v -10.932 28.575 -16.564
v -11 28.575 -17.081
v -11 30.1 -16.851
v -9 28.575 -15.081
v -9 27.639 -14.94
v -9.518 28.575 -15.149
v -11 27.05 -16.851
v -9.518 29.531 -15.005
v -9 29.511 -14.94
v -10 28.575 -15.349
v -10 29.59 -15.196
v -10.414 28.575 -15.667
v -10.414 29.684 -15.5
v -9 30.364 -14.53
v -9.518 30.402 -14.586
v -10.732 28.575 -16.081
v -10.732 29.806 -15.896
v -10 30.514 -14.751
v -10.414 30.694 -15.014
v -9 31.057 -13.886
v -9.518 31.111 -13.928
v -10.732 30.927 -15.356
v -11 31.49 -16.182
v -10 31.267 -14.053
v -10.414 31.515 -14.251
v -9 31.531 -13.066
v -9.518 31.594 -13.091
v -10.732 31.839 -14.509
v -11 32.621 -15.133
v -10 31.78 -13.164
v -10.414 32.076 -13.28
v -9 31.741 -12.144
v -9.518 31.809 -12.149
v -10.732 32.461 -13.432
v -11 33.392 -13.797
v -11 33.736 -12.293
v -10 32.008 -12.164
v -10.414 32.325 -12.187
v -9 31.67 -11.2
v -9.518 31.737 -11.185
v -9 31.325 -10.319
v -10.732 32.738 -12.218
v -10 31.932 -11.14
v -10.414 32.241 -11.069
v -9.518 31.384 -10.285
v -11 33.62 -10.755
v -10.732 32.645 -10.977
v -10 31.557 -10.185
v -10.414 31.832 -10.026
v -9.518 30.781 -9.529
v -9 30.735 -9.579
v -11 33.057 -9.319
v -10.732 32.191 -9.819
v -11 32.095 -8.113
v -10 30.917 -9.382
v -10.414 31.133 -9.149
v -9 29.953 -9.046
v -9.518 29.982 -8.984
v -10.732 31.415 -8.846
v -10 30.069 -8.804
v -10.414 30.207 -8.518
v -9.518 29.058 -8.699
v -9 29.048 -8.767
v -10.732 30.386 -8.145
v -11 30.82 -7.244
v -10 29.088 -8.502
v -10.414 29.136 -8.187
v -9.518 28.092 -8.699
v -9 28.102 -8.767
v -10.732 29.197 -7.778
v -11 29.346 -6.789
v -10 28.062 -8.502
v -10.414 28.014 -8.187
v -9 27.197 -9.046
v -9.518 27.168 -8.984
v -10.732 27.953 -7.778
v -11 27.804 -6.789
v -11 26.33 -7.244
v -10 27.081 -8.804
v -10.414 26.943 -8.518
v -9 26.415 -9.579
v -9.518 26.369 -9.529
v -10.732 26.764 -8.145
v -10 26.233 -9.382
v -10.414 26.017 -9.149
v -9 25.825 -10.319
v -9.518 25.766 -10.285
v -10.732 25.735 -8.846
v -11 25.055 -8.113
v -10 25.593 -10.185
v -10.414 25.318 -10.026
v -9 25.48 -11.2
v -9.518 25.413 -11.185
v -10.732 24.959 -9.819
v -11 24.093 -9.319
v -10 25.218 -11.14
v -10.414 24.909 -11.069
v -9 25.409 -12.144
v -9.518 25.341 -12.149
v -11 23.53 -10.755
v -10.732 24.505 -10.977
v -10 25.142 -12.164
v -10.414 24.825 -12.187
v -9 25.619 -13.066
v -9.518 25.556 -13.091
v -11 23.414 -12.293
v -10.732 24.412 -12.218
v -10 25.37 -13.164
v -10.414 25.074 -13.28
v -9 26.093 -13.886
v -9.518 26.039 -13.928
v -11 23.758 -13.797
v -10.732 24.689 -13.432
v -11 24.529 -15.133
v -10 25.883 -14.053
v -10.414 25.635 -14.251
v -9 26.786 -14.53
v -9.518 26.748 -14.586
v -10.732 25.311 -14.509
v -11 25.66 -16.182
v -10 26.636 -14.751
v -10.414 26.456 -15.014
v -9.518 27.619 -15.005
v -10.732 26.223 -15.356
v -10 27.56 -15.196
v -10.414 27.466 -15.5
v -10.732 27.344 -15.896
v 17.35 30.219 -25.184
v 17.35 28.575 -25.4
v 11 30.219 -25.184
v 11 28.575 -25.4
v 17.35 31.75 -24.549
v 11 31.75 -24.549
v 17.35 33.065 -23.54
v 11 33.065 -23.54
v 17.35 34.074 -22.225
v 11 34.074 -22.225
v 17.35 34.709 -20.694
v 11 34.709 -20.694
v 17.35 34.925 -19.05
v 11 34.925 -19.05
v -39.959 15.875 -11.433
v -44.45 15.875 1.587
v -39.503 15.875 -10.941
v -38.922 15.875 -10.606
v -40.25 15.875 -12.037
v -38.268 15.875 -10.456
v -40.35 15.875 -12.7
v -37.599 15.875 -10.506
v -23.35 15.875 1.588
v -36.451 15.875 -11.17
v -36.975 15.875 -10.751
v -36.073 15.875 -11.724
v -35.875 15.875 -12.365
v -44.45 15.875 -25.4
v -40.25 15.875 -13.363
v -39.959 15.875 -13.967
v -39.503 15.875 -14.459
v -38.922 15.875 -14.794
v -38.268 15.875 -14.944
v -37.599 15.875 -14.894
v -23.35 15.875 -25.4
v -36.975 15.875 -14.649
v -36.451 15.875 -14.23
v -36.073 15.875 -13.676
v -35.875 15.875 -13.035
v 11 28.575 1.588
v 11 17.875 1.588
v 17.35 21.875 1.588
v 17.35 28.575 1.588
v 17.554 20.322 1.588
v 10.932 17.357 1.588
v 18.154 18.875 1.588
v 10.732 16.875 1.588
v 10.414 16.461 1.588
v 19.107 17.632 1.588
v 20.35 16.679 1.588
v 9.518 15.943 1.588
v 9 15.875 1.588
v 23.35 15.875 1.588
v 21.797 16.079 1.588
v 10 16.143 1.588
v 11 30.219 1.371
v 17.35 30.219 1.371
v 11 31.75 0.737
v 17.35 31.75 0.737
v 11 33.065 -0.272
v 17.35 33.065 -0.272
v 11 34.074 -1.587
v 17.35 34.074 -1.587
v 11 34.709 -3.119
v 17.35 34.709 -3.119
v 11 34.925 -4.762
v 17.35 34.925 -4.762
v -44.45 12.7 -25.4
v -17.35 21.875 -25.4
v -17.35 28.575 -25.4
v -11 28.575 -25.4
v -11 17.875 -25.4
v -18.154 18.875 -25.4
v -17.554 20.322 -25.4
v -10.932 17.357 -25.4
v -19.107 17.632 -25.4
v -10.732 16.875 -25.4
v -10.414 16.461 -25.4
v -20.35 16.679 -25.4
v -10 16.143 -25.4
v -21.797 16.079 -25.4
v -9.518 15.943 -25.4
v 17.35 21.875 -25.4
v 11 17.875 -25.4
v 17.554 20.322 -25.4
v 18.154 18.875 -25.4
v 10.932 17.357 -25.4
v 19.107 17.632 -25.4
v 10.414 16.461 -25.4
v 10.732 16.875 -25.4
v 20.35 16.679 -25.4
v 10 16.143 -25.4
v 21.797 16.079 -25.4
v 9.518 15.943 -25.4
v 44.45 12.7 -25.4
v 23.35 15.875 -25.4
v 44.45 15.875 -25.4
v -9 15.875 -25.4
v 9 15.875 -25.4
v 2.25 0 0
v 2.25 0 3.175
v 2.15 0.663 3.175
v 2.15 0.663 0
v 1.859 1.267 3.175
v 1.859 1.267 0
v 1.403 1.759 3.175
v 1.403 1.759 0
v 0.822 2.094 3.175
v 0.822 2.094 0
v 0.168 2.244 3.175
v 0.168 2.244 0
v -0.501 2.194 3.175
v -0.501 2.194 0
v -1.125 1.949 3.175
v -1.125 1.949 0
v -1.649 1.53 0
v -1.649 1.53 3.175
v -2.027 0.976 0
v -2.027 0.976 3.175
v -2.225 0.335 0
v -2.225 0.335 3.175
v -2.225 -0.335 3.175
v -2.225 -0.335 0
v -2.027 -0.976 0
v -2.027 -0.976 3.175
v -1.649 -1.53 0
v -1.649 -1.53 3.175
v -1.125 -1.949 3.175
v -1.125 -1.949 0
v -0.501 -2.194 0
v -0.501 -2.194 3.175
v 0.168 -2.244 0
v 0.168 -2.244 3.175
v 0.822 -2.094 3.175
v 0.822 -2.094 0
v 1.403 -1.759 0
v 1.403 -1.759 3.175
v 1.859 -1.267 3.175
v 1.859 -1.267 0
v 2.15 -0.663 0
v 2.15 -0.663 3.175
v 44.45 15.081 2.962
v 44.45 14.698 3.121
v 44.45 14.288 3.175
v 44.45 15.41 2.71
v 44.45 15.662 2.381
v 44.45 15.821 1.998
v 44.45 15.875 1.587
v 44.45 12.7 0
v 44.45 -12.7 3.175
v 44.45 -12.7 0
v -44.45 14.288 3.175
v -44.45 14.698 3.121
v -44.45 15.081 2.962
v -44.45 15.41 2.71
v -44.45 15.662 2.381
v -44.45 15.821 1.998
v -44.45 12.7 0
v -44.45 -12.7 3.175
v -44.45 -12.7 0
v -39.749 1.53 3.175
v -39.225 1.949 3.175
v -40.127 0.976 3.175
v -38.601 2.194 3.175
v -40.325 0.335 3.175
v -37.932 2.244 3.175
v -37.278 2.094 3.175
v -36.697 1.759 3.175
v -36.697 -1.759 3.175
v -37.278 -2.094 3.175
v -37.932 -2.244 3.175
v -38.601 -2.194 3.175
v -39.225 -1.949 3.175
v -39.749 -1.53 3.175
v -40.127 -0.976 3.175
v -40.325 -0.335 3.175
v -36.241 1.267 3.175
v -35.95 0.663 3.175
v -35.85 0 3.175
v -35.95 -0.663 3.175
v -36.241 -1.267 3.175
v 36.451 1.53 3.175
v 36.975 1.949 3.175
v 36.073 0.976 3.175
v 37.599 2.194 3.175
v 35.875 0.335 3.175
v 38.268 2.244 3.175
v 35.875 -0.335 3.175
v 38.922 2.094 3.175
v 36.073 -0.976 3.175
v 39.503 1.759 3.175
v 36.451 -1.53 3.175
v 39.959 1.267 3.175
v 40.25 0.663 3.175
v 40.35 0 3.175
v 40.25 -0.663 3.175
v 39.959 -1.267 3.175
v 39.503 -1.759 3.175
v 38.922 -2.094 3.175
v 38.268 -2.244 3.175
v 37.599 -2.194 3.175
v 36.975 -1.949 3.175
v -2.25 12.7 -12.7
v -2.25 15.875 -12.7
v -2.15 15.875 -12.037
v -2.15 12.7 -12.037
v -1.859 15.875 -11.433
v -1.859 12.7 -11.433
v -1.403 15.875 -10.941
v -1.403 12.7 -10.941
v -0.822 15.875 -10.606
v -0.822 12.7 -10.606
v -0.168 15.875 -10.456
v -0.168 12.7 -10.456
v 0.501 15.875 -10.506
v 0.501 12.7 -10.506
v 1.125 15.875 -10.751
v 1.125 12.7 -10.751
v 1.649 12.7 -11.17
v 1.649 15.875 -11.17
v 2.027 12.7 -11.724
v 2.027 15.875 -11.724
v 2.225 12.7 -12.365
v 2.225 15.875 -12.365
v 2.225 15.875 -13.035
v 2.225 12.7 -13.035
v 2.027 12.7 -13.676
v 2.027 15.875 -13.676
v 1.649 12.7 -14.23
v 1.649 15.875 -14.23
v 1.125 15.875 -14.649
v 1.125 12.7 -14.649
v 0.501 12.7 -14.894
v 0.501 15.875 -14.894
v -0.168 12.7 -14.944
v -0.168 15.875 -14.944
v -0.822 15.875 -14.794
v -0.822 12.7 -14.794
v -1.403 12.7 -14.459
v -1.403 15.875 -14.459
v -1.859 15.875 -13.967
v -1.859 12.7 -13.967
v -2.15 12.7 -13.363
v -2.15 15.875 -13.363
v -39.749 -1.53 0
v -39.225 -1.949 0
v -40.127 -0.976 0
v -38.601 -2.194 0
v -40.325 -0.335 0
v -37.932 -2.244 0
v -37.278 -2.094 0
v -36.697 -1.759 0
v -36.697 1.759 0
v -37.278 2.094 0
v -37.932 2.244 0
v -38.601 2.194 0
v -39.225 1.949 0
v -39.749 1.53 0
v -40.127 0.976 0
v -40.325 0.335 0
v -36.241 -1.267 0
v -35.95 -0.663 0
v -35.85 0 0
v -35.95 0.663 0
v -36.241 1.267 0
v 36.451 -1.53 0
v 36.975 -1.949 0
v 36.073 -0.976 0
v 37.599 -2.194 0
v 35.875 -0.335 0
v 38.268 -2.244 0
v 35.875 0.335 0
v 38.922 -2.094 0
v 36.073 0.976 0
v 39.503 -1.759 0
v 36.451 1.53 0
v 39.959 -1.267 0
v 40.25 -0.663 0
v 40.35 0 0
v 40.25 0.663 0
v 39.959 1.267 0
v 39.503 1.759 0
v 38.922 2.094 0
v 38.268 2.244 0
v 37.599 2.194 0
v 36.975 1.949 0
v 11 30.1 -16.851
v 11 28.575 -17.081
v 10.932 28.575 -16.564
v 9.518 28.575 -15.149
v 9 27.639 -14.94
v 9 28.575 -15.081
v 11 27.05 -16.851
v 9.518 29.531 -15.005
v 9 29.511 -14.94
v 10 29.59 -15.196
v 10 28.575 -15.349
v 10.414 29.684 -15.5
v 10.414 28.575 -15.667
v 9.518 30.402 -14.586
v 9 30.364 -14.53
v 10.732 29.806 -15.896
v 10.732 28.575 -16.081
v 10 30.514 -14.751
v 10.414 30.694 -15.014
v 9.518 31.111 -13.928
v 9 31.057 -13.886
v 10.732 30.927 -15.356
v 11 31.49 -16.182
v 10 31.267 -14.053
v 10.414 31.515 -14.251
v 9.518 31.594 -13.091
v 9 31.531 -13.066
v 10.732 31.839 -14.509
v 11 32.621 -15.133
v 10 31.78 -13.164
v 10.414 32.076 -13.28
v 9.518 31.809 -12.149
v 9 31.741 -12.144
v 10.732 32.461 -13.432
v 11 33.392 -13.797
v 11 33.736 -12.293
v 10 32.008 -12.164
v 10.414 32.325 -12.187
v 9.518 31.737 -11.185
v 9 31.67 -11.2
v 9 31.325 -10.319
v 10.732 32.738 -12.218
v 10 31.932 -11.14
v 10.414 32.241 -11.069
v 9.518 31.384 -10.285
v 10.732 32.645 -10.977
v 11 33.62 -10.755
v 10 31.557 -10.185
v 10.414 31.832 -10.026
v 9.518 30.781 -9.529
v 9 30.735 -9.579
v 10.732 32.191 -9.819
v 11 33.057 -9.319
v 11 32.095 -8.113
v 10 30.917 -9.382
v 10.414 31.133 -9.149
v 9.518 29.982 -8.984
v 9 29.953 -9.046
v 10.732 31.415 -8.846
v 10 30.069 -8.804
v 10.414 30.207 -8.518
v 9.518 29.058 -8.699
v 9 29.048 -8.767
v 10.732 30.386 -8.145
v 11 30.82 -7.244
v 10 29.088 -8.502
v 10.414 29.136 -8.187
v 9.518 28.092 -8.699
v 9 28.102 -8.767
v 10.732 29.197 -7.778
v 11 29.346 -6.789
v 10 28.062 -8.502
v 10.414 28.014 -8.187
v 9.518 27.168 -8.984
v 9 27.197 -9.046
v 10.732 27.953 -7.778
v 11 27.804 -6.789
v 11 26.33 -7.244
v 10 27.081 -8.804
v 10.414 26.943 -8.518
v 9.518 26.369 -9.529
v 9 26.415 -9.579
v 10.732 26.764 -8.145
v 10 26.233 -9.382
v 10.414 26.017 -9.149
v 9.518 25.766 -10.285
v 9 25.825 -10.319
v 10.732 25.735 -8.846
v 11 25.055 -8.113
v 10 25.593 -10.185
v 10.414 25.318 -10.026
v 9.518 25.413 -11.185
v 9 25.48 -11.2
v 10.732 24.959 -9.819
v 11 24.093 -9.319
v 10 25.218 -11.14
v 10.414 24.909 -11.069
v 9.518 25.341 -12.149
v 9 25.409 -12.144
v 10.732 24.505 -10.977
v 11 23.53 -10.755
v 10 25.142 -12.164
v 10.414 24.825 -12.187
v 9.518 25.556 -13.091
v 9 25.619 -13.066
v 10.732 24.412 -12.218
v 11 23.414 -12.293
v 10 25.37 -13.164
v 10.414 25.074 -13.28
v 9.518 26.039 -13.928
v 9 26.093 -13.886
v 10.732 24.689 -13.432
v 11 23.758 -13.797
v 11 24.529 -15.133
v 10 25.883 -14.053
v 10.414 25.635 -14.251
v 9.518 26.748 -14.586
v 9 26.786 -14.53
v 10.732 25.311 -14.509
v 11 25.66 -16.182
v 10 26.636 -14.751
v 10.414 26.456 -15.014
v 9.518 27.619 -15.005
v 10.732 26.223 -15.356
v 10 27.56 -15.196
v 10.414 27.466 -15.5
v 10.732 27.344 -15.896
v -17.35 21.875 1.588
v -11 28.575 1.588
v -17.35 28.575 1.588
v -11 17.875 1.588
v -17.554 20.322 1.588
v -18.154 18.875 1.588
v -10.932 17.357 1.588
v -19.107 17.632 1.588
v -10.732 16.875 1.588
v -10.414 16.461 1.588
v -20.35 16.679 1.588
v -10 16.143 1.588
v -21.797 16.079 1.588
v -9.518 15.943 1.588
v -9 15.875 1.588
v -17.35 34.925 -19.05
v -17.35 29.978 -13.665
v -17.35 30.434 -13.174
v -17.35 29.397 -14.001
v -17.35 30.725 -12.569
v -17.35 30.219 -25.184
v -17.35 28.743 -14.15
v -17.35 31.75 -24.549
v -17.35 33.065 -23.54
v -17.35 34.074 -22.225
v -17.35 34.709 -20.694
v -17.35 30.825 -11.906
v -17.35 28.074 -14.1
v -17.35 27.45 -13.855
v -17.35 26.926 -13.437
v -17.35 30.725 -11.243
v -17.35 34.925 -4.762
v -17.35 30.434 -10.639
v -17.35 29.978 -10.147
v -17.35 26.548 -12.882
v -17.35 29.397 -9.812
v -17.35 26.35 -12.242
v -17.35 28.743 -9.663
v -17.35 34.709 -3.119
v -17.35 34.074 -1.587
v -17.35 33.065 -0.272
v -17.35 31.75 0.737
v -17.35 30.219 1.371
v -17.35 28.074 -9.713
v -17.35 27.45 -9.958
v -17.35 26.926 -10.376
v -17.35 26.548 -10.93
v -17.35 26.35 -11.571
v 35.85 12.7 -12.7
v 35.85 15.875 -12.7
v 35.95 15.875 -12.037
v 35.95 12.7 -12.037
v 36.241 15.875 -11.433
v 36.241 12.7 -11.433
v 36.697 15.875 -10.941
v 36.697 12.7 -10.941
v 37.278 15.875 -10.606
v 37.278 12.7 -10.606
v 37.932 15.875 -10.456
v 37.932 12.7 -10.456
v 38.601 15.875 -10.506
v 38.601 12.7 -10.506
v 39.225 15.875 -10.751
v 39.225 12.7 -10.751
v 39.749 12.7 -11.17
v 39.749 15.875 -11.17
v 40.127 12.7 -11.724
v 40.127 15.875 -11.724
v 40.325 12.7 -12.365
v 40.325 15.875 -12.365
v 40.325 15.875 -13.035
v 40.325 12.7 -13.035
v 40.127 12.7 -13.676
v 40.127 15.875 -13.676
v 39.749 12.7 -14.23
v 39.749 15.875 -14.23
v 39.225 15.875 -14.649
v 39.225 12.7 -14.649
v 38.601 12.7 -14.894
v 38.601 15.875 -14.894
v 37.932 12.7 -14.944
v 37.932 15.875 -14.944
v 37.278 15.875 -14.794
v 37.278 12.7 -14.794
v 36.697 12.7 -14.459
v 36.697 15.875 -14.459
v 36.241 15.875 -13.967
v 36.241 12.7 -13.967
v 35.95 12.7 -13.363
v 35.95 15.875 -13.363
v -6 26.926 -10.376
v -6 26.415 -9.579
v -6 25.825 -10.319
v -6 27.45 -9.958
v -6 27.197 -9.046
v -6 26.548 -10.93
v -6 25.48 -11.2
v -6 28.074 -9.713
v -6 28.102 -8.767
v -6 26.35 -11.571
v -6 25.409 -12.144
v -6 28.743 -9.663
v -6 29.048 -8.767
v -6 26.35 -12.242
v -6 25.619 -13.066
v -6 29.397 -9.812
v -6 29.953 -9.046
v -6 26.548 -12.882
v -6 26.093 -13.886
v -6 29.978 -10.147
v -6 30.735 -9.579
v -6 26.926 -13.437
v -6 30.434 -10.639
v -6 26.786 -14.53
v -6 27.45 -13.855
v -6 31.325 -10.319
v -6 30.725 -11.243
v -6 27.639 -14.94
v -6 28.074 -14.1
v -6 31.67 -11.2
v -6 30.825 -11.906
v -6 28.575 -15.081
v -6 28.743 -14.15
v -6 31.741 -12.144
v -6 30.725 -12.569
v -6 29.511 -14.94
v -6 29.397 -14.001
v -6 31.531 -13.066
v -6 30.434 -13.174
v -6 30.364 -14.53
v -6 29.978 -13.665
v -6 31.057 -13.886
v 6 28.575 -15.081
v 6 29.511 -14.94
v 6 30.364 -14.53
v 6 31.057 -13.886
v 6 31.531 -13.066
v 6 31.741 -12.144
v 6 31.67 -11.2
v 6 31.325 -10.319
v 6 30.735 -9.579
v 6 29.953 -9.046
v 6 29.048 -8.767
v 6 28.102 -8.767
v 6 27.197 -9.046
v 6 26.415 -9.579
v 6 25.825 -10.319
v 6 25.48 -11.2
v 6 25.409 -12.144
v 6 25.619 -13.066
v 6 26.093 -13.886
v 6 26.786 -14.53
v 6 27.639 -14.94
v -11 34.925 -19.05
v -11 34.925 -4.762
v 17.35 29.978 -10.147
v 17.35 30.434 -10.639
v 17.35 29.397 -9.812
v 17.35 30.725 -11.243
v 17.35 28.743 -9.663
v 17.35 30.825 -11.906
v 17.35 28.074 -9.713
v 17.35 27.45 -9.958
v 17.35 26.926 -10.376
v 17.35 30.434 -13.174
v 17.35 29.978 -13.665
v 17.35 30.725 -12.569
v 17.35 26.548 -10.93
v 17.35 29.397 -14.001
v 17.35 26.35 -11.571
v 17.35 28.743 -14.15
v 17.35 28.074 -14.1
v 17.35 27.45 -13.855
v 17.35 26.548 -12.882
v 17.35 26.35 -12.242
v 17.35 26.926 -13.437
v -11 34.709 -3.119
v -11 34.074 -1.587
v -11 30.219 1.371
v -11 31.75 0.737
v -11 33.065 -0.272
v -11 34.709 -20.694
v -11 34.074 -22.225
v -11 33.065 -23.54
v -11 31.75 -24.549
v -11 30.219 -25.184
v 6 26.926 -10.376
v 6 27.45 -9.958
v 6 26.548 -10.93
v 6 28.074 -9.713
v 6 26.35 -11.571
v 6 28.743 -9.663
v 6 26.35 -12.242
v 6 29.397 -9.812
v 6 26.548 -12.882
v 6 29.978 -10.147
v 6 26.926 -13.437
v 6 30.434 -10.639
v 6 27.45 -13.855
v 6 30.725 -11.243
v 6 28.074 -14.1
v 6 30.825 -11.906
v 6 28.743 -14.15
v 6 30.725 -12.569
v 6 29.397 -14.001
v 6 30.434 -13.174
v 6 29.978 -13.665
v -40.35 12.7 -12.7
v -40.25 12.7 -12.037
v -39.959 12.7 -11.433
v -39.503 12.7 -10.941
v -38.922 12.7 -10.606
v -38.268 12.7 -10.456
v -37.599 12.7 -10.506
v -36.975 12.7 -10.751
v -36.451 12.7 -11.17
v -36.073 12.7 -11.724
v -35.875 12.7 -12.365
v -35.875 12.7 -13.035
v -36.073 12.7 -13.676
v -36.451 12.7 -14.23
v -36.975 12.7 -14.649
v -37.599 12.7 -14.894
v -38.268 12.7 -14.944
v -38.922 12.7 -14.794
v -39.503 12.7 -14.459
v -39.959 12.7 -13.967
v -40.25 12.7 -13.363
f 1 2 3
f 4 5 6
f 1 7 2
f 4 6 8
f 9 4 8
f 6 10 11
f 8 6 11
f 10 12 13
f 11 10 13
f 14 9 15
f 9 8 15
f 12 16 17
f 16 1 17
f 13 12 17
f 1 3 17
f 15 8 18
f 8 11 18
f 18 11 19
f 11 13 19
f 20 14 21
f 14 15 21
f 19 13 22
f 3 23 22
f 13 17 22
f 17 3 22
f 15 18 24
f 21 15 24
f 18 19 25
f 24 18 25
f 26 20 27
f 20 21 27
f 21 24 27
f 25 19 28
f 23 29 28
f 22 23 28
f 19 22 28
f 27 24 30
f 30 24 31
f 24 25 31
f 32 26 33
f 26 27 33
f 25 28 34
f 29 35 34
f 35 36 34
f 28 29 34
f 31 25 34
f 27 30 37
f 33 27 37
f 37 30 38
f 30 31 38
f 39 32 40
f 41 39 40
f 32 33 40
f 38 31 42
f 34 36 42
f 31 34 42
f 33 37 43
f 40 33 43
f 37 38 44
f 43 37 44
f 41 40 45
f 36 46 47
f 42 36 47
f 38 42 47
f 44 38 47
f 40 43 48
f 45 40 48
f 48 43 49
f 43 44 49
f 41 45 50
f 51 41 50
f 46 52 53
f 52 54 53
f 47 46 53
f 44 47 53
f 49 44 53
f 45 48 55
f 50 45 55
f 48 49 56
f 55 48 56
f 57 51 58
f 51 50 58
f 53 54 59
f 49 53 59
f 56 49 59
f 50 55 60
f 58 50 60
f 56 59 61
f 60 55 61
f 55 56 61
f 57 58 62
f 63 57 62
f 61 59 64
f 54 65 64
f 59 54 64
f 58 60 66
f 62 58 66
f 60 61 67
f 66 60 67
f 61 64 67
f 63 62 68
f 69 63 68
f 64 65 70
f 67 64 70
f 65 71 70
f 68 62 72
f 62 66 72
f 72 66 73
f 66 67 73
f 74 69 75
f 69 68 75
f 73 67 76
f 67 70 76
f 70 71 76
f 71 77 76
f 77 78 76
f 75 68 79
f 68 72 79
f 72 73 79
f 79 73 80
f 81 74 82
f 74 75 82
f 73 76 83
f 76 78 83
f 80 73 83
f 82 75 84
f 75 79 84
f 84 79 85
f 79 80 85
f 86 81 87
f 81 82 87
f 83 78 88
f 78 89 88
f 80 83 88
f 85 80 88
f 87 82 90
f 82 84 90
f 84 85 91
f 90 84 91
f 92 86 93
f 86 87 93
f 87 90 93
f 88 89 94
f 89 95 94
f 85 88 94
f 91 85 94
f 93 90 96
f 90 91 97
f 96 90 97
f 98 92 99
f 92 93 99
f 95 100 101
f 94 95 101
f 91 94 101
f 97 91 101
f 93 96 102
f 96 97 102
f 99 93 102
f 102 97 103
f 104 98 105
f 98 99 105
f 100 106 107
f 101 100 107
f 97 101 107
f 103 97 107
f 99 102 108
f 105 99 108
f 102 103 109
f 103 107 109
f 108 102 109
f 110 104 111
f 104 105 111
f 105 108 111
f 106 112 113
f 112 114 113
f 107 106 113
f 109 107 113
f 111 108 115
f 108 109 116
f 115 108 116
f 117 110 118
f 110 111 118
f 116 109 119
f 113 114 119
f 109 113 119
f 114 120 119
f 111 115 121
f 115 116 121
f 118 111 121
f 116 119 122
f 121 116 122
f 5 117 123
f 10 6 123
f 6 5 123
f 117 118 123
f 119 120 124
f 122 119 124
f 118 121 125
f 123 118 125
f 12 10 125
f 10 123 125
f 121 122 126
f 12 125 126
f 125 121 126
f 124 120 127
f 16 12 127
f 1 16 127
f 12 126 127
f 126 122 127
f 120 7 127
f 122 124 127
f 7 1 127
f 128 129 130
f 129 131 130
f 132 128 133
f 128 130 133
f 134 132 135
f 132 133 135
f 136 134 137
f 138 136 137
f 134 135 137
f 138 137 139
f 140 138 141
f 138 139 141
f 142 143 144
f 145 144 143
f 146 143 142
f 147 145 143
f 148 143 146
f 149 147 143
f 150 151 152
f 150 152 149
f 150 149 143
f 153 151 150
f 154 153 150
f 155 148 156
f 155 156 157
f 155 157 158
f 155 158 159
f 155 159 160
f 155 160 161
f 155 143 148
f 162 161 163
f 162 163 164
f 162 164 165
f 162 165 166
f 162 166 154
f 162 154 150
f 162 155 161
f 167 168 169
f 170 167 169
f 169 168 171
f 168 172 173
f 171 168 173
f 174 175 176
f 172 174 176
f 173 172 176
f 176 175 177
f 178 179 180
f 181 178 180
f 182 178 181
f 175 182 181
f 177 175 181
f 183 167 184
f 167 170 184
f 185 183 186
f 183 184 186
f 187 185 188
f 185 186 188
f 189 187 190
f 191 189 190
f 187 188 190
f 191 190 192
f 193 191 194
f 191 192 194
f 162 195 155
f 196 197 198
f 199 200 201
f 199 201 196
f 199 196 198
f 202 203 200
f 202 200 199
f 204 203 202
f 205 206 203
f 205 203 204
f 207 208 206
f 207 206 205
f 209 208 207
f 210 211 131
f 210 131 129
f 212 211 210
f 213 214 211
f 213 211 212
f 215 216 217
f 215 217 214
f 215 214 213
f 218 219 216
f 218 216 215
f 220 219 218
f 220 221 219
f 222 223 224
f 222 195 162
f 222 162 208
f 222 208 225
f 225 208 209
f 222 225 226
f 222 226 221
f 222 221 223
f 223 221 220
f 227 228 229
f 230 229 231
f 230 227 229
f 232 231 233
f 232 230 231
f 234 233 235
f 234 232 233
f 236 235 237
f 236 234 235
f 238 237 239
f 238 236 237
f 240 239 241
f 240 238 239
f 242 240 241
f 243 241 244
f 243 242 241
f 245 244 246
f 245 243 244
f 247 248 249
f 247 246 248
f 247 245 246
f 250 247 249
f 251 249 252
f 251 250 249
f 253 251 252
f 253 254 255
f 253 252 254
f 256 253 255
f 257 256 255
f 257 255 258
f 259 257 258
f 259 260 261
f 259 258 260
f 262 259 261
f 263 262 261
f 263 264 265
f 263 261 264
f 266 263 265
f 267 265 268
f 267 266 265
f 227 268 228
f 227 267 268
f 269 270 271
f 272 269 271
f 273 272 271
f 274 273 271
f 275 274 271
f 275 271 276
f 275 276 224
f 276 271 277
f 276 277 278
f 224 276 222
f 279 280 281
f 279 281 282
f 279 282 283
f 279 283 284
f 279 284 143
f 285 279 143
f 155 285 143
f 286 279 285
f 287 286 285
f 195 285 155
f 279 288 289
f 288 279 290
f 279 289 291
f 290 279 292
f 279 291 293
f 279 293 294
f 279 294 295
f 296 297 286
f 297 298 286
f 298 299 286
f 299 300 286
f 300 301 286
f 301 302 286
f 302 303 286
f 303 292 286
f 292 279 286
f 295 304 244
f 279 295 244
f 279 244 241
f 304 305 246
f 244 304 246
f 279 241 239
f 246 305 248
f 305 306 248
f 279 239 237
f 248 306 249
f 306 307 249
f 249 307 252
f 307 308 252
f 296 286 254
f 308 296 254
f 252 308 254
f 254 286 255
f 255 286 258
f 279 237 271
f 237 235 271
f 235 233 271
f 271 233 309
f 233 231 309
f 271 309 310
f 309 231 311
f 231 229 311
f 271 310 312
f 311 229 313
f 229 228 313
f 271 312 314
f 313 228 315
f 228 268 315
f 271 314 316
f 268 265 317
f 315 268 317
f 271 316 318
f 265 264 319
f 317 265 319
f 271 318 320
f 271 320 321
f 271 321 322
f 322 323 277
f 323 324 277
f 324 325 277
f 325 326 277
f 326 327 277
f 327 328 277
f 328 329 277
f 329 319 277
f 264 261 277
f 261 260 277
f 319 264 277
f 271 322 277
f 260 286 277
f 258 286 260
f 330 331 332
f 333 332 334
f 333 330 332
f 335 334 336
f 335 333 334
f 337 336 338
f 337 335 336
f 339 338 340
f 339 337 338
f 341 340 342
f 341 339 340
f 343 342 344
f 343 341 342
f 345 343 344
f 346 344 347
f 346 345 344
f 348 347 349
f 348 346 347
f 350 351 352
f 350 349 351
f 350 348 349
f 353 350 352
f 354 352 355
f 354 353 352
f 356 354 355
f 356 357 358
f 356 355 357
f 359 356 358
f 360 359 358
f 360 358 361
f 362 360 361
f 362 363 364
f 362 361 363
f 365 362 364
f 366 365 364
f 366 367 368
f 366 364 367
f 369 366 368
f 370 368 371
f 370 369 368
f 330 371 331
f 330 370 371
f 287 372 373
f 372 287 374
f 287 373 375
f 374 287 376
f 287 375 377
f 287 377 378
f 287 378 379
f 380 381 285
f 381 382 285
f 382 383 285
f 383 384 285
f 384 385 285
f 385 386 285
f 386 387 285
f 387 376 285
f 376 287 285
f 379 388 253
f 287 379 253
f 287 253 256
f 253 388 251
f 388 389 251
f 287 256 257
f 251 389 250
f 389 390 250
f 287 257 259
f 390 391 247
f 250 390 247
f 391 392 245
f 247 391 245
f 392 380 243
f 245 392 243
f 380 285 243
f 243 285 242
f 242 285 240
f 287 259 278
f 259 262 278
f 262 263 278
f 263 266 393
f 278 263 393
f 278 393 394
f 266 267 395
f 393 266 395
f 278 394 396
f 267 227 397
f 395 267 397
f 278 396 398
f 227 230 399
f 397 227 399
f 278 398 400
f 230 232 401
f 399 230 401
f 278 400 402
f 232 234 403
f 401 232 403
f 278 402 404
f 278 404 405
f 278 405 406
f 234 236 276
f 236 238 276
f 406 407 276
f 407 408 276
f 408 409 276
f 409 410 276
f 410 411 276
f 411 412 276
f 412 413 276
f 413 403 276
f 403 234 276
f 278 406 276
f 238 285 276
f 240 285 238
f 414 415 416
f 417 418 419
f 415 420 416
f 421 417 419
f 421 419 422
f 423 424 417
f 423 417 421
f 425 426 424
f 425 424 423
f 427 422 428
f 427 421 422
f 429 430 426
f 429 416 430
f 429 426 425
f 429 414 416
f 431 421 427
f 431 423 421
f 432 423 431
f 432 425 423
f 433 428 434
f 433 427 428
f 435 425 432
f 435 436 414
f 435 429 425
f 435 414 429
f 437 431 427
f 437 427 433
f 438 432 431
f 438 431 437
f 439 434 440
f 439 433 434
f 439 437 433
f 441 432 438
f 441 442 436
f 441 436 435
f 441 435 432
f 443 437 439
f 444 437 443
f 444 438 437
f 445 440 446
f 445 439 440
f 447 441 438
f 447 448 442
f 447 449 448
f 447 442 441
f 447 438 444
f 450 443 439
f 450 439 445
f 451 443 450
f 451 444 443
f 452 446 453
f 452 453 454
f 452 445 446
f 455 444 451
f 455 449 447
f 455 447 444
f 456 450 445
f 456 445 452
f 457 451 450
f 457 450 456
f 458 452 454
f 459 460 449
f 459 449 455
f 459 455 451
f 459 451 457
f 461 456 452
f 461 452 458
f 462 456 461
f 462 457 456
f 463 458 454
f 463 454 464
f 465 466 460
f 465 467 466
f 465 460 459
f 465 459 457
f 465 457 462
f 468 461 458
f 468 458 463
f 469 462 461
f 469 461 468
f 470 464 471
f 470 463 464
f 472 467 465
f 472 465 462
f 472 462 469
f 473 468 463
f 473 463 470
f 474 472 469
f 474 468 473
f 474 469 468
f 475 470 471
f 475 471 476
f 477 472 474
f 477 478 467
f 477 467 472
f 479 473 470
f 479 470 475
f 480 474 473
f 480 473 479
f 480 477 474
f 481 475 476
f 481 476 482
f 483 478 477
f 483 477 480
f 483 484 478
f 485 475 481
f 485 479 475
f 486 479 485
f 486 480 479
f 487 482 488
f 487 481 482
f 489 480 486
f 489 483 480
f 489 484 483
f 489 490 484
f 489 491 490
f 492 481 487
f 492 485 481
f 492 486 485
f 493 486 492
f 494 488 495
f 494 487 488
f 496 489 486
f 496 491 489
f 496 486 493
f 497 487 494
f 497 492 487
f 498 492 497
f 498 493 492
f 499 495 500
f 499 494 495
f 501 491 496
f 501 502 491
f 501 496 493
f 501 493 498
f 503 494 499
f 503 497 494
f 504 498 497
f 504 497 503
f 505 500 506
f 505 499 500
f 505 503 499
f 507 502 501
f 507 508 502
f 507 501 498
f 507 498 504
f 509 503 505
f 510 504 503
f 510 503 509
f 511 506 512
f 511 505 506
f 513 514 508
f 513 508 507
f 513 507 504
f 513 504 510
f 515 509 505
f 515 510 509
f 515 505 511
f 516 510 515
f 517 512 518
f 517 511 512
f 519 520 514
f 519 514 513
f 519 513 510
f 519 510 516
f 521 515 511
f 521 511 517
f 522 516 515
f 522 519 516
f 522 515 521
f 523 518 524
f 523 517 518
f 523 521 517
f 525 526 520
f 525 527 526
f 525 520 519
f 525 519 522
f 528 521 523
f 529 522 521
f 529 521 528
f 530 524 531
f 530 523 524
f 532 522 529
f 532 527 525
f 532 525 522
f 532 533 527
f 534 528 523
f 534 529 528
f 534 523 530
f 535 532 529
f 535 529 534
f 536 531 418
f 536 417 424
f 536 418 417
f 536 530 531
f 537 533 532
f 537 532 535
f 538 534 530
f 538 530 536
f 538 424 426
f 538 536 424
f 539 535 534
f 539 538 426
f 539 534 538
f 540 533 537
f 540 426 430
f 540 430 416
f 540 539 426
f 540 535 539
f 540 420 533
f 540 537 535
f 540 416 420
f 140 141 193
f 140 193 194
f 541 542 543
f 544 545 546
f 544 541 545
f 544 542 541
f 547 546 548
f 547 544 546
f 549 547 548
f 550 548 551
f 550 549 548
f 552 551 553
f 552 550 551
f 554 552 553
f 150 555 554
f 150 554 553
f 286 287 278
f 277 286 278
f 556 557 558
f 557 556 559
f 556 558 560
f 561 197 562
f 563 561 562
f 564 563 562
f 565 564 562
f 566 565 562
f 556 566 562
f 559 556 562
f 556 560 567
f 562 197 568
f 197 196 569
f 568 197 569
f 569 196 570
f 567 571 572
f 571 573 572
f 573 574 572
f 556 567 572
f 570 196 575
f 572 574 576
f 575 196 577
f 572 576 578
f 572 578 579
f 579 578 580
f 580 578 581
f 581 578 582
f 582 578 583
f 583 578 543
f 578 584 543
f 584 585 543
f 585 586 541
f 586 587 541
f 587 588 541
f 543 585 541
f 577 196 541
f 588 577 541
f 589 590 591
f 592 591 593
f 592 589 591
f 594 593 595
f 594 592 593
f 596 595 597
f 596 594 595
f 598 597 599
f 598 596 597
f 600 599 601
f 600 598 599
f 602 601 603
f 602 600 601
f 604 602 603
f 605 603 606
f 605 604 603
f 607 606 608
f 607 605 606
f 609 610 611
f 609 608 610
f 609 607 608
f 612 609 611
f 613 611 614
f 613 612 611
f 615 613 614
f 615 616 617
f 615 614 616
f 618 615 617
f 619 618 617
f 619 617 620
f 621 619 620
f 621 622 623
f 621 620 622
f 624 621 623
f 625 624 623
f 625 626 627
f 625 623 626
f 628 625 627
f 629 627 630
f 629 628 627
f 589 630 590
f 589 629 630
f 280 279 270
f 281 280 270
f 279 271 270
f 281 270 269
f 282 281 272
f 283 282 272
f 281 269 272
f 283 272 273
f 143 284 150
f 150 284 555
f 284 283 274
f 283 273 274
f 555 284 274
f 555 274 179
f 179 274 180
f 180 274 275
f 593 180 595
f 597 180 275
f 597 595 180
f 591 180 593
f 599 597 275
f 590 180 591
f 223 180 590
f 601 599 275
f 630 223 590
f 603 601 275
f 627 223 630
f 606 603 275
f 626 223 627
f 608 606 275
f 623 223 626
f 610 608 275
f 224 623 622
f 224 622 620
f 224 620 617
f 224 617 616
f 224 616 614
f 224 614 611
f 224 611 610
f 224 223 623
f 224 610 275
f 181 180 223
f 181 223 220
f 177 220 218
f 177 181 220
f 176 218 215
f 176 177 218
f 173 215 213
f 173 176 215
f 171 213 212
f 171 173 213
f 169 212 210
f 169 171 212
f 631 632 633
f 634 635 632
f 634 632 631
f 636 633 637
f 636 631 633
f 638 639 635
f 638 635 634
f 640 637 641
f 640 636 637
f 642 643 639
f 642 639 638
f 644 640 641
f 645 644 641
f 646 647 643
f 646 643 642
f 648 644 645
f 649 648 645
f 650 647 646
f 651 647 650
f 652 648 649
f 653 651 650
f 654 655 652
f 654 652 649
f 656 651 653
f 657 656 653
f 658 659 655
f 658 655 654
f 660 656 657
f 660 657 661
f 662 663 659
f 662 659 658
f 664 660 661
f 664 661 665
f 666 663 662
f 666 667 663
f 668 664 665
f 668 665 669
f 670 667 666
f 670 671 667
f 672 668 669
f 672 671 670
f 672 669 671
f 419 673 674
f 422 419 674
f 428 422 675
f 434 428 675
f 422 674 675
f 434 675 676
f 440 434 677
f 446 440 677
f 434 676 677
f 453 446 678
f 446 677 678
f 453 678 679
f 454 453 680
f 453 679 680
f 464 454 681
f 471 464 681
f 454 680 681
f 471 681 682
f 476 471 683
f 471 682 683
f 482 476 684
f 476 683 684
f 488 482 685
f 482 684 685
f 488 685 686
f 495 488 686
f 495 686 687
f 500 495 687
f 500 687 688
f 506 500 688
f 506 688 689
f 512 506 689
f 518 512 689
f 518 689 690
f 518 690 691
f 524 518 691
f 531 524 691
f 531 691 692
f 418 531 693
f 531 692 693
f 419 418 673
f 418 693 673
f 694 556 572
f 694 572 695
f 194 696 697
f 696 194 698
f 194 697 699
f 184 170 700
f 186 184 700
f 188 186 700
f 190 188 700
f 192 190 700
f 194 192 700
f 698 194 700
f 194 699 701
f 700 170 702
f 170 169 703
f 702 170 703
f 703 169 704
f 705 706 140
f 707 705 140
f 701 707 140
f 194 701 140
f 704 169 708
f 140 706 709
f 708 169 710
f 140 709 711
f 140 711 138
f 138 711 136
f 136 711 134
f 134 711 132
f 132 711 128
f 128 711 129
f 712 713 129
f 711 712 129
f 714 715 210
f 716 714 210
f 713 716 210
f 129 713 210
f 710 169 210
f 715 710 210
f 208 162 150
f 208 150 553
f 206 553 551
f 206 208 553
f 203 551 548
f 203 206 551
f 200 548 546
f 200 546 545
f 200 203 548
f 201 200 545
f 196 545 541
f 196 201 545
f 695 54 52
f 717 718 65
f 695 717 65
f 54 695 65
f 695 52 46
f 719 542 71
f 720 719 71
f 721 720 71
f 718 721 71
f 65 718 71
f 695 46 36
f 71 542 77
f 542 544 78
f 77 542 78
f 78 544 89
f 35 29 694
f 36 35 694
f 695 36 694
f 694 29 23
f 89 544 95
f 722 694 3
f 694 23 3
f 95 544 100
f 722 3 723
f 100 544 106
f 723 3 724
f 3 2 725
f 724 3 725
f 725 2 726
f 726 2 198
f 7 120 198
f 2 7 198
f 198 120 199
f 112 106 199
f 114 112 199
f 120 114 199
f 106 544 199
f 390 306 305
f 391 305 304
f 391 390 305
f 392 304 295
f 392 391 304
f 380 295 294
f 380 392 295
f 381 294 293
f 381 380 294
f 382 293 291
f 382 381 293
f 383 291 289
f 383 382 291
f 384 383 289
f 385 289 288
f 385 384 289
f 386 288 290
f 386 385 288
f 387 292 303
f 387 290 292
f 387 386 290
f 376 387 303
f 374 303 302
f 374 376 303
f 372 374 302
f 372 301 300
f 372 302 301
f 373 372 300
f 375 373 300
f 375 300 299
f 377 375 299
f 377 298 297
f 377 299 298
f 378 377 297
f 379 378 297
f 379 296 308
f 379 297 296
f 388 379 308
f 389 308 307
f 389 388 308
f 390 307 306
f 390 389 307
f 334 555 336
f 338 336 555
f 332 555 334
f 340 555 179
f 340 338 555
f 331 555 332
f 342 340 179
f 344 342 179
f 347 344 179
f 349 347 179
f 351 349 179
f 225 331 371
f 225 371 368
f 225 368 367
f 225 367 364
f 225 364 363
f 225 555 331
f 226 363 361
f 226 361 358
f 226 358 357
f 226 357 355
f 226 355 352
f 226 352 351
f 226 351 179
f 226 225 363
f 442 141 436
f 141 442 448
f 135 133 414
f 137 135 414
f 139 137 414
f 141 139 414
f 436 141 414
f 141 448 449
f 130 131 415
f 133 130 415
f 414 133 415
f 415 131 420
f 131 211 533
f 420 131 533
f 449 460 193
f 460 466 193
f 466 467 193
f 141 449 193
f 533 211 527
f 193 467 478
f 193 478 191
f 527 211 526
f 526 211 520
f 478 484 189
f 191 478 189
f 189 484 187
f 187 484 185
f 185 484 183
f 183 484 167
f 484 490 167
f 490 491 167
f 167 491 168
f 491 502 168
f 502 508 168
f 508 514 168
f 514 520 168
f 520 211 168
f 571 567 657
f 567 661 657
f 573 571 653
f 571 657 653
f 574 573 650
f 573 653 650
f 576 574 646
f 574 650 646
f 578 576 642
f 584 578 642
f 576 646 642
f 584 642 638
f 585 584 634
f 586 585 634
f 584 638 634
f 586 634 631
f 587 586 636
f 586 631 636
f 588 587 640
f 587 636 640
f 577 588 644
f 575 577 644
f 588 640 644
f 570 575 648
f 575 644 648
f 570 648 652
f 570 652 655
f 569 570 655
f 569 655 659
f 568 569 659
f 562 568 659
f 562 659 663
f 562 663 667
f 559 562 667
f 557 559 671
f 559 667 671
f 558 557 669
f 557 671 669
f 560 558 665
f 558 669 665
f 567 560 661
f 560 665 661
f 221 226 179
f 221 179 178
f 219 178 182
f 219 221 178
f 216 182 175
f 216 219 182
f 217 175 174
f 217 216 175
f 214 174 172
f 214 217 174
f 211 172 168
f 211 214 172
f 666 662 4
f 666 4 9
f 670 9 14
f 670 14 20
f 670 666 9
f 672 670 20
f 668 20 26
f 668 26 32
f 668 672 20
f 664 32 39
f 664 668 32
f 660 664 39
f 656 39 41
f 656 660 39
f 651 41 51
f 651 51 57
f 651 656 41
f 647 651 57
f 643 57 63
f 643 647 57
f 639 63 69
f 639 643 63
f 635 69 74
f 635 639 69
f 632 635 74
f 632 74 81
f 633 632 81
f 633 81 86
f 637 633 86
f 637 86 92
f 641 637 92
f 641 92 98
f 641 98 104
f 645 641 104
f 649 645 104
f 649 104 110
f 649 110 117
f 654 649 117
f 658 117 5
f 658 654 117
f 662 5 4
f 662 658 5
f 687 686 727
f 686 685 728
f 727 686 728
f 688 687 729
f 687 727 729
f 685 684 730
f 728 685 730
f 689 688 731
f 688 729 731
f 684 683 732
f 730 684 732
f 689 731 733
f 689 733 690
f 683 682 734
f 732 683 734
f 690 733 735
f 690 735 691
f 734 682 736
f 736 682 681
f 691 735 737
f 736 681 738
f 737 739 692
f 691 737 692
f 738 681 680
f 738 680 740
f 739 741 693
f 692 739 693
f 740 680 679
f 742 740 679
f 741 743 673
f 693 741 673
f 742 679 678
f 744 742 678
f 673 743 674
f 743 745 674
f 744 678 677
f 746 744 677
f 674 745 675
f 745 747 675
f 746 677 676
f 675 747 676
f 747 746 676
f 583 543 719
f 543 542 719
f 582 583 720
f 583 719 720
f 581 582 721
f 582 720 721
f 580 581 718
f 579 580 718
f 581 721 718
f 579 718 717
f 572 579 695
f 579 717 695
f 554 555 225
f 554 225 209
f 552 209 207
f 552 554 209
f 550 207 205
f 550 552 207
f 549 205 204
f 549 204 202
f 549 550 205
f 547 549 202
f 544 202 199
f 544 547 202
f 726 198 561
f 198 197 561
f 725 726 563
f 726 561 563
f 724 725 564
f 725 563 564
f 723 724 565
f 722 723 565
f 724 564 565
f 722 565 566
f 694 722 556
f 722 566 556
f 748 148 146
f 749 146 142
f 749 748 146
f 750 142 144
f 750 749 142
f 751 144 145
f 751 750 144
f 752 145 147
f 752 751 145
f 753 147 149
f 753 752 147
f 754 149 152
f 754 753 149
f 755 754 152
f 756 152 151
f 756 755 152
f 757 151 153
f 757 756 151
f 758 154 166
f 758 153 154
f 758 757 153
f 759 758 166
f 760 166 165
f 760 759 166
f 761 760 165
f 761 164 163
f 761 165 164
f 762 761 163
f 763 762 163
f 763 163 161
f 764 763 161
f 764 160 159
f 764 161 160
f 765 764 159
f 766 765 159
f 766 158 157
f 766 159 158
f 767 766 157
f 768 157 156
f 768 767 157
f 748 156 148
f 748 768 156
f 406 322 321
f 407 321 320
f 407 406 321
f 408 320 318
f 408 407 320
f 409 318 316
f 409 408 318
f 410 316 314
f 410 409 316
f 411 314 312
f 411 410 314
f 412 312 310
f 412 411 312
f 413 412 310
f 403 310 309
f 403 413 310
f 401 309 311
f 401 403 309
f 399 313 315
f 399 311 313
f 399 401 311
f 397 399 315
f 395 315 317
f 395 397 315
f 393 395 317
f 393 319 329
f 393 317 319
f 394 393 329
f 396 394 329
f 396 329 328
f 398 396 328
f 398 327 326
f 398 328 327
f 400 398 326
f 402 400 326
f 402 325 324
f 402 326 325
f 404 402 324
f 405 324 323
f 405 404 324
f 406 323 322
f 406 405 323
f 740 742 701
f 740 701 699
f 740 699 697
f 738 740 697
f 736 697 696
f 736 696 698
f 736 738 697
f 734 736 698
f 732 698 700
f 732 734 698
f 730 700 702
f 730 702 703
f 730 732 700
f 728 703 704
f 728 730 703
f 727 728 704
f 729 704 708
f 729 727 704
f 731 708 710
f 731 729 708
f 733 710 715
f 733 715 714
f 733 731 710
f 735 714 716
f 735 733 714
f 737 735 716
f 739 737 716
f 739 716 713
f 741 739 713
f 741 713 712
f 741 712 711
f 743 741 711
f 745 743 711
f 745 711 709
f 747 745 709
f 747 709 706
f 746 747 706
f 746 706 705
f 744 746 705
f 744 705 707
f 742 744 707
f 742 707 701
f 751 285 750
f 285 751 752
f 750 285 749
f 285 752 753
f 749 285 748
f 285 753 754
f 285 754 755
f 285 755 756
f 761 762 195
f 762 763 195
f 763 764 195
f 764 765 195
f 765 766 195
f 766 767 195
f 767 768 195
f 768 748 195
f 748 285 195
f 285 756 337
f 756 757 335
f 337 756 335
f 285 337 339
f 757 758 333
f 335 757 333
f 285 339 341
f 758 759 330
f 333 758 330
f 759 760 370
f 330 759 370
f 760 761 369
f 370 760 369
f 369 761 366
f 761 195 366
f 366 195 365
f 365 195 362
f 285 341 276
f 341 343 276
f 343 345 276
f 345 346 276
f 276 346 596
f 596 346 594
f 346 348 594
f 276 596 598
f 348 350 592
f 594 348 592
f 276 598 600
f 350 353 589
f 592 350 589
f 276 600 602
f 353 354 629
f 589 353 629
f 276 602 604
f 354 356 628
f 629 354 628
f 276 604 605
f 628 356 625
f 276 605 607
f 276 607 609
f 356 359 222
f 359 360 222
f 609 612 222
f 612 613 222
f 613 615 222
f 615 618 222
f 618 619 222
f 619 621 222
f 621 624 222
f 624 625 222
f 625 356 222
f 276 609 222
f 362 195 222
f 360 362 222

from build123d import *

# Parameters (mm, degrees)
SKETCH1_W           = 88.9
SKETCH1_H           = 25.4
SKETCH1_R           = 2.25
BOSS_EXTRUDE1_DEPTH = 3.175
SKETCH2_W           = 88.9
SKETCH2_H           = 28.575
SKETCH2_R           = 2.25
BOSS_EXTRUDE2_DEPTH = 3.175
FILLET1_R           = 1.5875
BOSS_EXTRUDE3_DEPTH = 19.05
SKETCH5_R           = 2.25
CUT_EXTRUDE1_DEPTH  = 100
FILLET2_R           = 6.35
BOSS_EXTRUDE4_START = 5
SKETCH6_R           = 3.175
SKETCH6_R_2         = 2.25
BOSS_EXTRUDE4_DEPTH = 5
FILLET3_R           = 2
FILLET4_R           = 6
FILLET5_R           = 2


with BuildPart() as part:
    # Sketch1 → Boss-Extrude1 (new body)
    with BuildSketch(Plane.XY):
        Rectangle(SKETCH1_W, SKETCH1_H)
        Circle(SKETCH1_R, mode=Mode.SUBTRACT)
        with Locations((-38.1, 0)):
            Circle(SKETCH1_R, mode=Mode.SUBTRACT)
        with Locations((38.1, 0)):
            Circle(SKETCH1_R, mode=Mode.SUBTRACT)
    extrude(amount=BOSS_EXTRUDE1_DEPTH)

    # Sketch2 → Boss-Extrude2 (add)
    with BuildSketch(Plane(origin=(0, 12.7, 0), x_dir=(1, 0, 0), z_dir=(0, 1, 0))):
        with Locations((0, 11.1125)):
            Rectangle(SKETCH2_W, SKETCH2_H)
        with Locations(Location((0, 12.7, 0), (0, 0, 180))):
            Circle(SKETCH2_R, mode=Mode.SUBTRACT)
        with Locations(Location((-38.1, 12.7, 0), (0, 0, 180))):
            Circle(SKETCH2_R, mode=Mode.SUBTRACT)
        with Locations(Location((38.1, 12.7, 0), (0, 0, 180))):
            Circle(SKETCH2_R, mode=Mode.SUBTRACT)
    extrude(amount=BOSS_EXTRUDE2_DEPTH)

    # Fillet1
    fillet1_edges = [part.edges().sort_by_distance(p)[0] for p in [
        (0, 15.875, 3.175),
    ]]
    fillet(fillet1_edges, radius=FILLET1_R)

    # Sketch4 → Boss-Extrude3 (add)
    with BuildSketch(Plane(origin=(0, 15.875, 0), x_dir=(1, 0, 0), z_dir=(0, 1, 0))):
        Polygon((-11, 12.7), (-11, 25.4), (-17.35, 25.4), (-17.35, 12.7), (-17.35, -1.5875), (-11, -1.5875), align=None)
        Polygon((11, 25.4), (11, 12.7), (11, -1.5875), (17.35, -1.5875), (17.35, 12.7), (17.35, 25.4), align=None)
    extrude(amount=BOSS_EXTRUDE3_DEPTH)

    # Sketch5 → Cut-Extrude1 (cut)
    with BuildSketch(Plane(origin=(17.35, 0, 0), x_dir=(0, 0, -1), z_dir=(1, 0, 0))):
        with Locations(Location((11.90625, 28.575, 0), (0, 0, 90))):
            Circle(SKETCH5_R)
    extrude(amount=-CUT_EXTRUDE1_DEPTH, mode=Mode.SUBTRACT)

    # Fillet2
    fillet2_edges = [part.edges().sort_by_distance(p)[0] for p in [
        (-14.175, 34.925, -25.4),
        (-14.175, 34.925, 1.5875),
        (14.175, 34.925, -25.4),
        (14.175, 34.925, 1.5875),
    ]]
    fillet(fillet2_edges, radius=FILLET2_R)

    # Sketch6 → Boss-Extrude4 (add)
    with BuildSketch(Plane(origin=(-11, 0, 0), x_dir=(0, 0, -1), z_dir=(1, 0, 0)).offset(BOSS_EXTRUDE4_START)):
        with Locations((11.90625, 28.575)):
            Circle(SKETCH6_R)
        with Locations(Location((11.90625, 28.575, 0), (0, 0, 90))):
            Circle(SKETCH6_R_2, mode=Mode.SUBTRACT)
    extrude(amount=-BOSS_EXTRUDE4_DEPTH)

    # Fillet3
    fillet3_edges = [part.edges().sort_by_distance(p)[0] for p in [
        (-11, 28.575, -8.73125),
    ]]
    fillet(fillet3_edges, radius=FILLET3_R)

    # Mirror2: part across plane


with BuildPart() as part_1:
    add(part.part)
    add(part.part.mirror(Plane(origin=(0, 0, 0), x_dir=(0, 0, 1), z_dir=(1, 0, 0))))

    # Fillet4
    # the kernel refuses this fillet: 6 mm, written as the material it adds along each edge
    with BuildSketch(Plane(origin=(-17.35, 15.875, -25.4), x_dir=(0, 1, 0), z_dir=(0, 0, 1))) as fillet4_piece_1:
        with BuildLine():
            CenterArc((FILLET4_R, FILLET4_R), FILLET4_R, 180, 90)
            Line((0, FILLET4_R), (0, 0))
            Line((0, 0), (FILLET4_R, 0))
        make_face()
    extrude(amount=26.9875)
    with BuildSketch(Plane(origin=(17.35, 15.875, 1.5875), x_dir=(1, 0, 0), z_dir=(0, 0, -1))) as fillet4_piece_2:
        with BuildLine():
            CenterArc((FILLET4_R, -FILLET4_R), FILLET4_R, 90, 90)
            Line((0, -FILLET4_R), (0, 0))
            Line((0, 0), (FILLET4_R, 0))
        make_face()
    extrude(amount=26.9875)

    # Fillet5
    # the kernel refuses this fillet: 2 mm, written as the material it adds along each edge
    with BuildSketch(Plane(origin=(-11, 15.875, 1.5875), x_dir=(0, 1, 0), z_dir=(0, 0, -1))) as fillet5_piece_1:
        with BuildLine():
            CenterArc((FILLET5_R, FILLET5_R), FILLET5_R, 180, 90)
            Line((0, FILLET5_R), (0, 0))
            Line((0, 0), (FILLET5_R, 0))
        make_face()
    extrude(amount=26.9875)
    with BuildSketch(Plane(origin=(11, 15.875, -25.4), x_dir=(-1, 0, 0), z_dir=(0, 0, 1))) as fillet5_piece_2:
        with BuildLine():
            CenterArc((FILLET5_R, -FILLET5_R), FILLET5_R, 90, 90)
            Line((0, -FILLET5_R), (0, 0))
            Line((0, 0), (FILLET5_R, 0))
        make_face()
    extrude(amount=26.9875)


solid = part_1.part
